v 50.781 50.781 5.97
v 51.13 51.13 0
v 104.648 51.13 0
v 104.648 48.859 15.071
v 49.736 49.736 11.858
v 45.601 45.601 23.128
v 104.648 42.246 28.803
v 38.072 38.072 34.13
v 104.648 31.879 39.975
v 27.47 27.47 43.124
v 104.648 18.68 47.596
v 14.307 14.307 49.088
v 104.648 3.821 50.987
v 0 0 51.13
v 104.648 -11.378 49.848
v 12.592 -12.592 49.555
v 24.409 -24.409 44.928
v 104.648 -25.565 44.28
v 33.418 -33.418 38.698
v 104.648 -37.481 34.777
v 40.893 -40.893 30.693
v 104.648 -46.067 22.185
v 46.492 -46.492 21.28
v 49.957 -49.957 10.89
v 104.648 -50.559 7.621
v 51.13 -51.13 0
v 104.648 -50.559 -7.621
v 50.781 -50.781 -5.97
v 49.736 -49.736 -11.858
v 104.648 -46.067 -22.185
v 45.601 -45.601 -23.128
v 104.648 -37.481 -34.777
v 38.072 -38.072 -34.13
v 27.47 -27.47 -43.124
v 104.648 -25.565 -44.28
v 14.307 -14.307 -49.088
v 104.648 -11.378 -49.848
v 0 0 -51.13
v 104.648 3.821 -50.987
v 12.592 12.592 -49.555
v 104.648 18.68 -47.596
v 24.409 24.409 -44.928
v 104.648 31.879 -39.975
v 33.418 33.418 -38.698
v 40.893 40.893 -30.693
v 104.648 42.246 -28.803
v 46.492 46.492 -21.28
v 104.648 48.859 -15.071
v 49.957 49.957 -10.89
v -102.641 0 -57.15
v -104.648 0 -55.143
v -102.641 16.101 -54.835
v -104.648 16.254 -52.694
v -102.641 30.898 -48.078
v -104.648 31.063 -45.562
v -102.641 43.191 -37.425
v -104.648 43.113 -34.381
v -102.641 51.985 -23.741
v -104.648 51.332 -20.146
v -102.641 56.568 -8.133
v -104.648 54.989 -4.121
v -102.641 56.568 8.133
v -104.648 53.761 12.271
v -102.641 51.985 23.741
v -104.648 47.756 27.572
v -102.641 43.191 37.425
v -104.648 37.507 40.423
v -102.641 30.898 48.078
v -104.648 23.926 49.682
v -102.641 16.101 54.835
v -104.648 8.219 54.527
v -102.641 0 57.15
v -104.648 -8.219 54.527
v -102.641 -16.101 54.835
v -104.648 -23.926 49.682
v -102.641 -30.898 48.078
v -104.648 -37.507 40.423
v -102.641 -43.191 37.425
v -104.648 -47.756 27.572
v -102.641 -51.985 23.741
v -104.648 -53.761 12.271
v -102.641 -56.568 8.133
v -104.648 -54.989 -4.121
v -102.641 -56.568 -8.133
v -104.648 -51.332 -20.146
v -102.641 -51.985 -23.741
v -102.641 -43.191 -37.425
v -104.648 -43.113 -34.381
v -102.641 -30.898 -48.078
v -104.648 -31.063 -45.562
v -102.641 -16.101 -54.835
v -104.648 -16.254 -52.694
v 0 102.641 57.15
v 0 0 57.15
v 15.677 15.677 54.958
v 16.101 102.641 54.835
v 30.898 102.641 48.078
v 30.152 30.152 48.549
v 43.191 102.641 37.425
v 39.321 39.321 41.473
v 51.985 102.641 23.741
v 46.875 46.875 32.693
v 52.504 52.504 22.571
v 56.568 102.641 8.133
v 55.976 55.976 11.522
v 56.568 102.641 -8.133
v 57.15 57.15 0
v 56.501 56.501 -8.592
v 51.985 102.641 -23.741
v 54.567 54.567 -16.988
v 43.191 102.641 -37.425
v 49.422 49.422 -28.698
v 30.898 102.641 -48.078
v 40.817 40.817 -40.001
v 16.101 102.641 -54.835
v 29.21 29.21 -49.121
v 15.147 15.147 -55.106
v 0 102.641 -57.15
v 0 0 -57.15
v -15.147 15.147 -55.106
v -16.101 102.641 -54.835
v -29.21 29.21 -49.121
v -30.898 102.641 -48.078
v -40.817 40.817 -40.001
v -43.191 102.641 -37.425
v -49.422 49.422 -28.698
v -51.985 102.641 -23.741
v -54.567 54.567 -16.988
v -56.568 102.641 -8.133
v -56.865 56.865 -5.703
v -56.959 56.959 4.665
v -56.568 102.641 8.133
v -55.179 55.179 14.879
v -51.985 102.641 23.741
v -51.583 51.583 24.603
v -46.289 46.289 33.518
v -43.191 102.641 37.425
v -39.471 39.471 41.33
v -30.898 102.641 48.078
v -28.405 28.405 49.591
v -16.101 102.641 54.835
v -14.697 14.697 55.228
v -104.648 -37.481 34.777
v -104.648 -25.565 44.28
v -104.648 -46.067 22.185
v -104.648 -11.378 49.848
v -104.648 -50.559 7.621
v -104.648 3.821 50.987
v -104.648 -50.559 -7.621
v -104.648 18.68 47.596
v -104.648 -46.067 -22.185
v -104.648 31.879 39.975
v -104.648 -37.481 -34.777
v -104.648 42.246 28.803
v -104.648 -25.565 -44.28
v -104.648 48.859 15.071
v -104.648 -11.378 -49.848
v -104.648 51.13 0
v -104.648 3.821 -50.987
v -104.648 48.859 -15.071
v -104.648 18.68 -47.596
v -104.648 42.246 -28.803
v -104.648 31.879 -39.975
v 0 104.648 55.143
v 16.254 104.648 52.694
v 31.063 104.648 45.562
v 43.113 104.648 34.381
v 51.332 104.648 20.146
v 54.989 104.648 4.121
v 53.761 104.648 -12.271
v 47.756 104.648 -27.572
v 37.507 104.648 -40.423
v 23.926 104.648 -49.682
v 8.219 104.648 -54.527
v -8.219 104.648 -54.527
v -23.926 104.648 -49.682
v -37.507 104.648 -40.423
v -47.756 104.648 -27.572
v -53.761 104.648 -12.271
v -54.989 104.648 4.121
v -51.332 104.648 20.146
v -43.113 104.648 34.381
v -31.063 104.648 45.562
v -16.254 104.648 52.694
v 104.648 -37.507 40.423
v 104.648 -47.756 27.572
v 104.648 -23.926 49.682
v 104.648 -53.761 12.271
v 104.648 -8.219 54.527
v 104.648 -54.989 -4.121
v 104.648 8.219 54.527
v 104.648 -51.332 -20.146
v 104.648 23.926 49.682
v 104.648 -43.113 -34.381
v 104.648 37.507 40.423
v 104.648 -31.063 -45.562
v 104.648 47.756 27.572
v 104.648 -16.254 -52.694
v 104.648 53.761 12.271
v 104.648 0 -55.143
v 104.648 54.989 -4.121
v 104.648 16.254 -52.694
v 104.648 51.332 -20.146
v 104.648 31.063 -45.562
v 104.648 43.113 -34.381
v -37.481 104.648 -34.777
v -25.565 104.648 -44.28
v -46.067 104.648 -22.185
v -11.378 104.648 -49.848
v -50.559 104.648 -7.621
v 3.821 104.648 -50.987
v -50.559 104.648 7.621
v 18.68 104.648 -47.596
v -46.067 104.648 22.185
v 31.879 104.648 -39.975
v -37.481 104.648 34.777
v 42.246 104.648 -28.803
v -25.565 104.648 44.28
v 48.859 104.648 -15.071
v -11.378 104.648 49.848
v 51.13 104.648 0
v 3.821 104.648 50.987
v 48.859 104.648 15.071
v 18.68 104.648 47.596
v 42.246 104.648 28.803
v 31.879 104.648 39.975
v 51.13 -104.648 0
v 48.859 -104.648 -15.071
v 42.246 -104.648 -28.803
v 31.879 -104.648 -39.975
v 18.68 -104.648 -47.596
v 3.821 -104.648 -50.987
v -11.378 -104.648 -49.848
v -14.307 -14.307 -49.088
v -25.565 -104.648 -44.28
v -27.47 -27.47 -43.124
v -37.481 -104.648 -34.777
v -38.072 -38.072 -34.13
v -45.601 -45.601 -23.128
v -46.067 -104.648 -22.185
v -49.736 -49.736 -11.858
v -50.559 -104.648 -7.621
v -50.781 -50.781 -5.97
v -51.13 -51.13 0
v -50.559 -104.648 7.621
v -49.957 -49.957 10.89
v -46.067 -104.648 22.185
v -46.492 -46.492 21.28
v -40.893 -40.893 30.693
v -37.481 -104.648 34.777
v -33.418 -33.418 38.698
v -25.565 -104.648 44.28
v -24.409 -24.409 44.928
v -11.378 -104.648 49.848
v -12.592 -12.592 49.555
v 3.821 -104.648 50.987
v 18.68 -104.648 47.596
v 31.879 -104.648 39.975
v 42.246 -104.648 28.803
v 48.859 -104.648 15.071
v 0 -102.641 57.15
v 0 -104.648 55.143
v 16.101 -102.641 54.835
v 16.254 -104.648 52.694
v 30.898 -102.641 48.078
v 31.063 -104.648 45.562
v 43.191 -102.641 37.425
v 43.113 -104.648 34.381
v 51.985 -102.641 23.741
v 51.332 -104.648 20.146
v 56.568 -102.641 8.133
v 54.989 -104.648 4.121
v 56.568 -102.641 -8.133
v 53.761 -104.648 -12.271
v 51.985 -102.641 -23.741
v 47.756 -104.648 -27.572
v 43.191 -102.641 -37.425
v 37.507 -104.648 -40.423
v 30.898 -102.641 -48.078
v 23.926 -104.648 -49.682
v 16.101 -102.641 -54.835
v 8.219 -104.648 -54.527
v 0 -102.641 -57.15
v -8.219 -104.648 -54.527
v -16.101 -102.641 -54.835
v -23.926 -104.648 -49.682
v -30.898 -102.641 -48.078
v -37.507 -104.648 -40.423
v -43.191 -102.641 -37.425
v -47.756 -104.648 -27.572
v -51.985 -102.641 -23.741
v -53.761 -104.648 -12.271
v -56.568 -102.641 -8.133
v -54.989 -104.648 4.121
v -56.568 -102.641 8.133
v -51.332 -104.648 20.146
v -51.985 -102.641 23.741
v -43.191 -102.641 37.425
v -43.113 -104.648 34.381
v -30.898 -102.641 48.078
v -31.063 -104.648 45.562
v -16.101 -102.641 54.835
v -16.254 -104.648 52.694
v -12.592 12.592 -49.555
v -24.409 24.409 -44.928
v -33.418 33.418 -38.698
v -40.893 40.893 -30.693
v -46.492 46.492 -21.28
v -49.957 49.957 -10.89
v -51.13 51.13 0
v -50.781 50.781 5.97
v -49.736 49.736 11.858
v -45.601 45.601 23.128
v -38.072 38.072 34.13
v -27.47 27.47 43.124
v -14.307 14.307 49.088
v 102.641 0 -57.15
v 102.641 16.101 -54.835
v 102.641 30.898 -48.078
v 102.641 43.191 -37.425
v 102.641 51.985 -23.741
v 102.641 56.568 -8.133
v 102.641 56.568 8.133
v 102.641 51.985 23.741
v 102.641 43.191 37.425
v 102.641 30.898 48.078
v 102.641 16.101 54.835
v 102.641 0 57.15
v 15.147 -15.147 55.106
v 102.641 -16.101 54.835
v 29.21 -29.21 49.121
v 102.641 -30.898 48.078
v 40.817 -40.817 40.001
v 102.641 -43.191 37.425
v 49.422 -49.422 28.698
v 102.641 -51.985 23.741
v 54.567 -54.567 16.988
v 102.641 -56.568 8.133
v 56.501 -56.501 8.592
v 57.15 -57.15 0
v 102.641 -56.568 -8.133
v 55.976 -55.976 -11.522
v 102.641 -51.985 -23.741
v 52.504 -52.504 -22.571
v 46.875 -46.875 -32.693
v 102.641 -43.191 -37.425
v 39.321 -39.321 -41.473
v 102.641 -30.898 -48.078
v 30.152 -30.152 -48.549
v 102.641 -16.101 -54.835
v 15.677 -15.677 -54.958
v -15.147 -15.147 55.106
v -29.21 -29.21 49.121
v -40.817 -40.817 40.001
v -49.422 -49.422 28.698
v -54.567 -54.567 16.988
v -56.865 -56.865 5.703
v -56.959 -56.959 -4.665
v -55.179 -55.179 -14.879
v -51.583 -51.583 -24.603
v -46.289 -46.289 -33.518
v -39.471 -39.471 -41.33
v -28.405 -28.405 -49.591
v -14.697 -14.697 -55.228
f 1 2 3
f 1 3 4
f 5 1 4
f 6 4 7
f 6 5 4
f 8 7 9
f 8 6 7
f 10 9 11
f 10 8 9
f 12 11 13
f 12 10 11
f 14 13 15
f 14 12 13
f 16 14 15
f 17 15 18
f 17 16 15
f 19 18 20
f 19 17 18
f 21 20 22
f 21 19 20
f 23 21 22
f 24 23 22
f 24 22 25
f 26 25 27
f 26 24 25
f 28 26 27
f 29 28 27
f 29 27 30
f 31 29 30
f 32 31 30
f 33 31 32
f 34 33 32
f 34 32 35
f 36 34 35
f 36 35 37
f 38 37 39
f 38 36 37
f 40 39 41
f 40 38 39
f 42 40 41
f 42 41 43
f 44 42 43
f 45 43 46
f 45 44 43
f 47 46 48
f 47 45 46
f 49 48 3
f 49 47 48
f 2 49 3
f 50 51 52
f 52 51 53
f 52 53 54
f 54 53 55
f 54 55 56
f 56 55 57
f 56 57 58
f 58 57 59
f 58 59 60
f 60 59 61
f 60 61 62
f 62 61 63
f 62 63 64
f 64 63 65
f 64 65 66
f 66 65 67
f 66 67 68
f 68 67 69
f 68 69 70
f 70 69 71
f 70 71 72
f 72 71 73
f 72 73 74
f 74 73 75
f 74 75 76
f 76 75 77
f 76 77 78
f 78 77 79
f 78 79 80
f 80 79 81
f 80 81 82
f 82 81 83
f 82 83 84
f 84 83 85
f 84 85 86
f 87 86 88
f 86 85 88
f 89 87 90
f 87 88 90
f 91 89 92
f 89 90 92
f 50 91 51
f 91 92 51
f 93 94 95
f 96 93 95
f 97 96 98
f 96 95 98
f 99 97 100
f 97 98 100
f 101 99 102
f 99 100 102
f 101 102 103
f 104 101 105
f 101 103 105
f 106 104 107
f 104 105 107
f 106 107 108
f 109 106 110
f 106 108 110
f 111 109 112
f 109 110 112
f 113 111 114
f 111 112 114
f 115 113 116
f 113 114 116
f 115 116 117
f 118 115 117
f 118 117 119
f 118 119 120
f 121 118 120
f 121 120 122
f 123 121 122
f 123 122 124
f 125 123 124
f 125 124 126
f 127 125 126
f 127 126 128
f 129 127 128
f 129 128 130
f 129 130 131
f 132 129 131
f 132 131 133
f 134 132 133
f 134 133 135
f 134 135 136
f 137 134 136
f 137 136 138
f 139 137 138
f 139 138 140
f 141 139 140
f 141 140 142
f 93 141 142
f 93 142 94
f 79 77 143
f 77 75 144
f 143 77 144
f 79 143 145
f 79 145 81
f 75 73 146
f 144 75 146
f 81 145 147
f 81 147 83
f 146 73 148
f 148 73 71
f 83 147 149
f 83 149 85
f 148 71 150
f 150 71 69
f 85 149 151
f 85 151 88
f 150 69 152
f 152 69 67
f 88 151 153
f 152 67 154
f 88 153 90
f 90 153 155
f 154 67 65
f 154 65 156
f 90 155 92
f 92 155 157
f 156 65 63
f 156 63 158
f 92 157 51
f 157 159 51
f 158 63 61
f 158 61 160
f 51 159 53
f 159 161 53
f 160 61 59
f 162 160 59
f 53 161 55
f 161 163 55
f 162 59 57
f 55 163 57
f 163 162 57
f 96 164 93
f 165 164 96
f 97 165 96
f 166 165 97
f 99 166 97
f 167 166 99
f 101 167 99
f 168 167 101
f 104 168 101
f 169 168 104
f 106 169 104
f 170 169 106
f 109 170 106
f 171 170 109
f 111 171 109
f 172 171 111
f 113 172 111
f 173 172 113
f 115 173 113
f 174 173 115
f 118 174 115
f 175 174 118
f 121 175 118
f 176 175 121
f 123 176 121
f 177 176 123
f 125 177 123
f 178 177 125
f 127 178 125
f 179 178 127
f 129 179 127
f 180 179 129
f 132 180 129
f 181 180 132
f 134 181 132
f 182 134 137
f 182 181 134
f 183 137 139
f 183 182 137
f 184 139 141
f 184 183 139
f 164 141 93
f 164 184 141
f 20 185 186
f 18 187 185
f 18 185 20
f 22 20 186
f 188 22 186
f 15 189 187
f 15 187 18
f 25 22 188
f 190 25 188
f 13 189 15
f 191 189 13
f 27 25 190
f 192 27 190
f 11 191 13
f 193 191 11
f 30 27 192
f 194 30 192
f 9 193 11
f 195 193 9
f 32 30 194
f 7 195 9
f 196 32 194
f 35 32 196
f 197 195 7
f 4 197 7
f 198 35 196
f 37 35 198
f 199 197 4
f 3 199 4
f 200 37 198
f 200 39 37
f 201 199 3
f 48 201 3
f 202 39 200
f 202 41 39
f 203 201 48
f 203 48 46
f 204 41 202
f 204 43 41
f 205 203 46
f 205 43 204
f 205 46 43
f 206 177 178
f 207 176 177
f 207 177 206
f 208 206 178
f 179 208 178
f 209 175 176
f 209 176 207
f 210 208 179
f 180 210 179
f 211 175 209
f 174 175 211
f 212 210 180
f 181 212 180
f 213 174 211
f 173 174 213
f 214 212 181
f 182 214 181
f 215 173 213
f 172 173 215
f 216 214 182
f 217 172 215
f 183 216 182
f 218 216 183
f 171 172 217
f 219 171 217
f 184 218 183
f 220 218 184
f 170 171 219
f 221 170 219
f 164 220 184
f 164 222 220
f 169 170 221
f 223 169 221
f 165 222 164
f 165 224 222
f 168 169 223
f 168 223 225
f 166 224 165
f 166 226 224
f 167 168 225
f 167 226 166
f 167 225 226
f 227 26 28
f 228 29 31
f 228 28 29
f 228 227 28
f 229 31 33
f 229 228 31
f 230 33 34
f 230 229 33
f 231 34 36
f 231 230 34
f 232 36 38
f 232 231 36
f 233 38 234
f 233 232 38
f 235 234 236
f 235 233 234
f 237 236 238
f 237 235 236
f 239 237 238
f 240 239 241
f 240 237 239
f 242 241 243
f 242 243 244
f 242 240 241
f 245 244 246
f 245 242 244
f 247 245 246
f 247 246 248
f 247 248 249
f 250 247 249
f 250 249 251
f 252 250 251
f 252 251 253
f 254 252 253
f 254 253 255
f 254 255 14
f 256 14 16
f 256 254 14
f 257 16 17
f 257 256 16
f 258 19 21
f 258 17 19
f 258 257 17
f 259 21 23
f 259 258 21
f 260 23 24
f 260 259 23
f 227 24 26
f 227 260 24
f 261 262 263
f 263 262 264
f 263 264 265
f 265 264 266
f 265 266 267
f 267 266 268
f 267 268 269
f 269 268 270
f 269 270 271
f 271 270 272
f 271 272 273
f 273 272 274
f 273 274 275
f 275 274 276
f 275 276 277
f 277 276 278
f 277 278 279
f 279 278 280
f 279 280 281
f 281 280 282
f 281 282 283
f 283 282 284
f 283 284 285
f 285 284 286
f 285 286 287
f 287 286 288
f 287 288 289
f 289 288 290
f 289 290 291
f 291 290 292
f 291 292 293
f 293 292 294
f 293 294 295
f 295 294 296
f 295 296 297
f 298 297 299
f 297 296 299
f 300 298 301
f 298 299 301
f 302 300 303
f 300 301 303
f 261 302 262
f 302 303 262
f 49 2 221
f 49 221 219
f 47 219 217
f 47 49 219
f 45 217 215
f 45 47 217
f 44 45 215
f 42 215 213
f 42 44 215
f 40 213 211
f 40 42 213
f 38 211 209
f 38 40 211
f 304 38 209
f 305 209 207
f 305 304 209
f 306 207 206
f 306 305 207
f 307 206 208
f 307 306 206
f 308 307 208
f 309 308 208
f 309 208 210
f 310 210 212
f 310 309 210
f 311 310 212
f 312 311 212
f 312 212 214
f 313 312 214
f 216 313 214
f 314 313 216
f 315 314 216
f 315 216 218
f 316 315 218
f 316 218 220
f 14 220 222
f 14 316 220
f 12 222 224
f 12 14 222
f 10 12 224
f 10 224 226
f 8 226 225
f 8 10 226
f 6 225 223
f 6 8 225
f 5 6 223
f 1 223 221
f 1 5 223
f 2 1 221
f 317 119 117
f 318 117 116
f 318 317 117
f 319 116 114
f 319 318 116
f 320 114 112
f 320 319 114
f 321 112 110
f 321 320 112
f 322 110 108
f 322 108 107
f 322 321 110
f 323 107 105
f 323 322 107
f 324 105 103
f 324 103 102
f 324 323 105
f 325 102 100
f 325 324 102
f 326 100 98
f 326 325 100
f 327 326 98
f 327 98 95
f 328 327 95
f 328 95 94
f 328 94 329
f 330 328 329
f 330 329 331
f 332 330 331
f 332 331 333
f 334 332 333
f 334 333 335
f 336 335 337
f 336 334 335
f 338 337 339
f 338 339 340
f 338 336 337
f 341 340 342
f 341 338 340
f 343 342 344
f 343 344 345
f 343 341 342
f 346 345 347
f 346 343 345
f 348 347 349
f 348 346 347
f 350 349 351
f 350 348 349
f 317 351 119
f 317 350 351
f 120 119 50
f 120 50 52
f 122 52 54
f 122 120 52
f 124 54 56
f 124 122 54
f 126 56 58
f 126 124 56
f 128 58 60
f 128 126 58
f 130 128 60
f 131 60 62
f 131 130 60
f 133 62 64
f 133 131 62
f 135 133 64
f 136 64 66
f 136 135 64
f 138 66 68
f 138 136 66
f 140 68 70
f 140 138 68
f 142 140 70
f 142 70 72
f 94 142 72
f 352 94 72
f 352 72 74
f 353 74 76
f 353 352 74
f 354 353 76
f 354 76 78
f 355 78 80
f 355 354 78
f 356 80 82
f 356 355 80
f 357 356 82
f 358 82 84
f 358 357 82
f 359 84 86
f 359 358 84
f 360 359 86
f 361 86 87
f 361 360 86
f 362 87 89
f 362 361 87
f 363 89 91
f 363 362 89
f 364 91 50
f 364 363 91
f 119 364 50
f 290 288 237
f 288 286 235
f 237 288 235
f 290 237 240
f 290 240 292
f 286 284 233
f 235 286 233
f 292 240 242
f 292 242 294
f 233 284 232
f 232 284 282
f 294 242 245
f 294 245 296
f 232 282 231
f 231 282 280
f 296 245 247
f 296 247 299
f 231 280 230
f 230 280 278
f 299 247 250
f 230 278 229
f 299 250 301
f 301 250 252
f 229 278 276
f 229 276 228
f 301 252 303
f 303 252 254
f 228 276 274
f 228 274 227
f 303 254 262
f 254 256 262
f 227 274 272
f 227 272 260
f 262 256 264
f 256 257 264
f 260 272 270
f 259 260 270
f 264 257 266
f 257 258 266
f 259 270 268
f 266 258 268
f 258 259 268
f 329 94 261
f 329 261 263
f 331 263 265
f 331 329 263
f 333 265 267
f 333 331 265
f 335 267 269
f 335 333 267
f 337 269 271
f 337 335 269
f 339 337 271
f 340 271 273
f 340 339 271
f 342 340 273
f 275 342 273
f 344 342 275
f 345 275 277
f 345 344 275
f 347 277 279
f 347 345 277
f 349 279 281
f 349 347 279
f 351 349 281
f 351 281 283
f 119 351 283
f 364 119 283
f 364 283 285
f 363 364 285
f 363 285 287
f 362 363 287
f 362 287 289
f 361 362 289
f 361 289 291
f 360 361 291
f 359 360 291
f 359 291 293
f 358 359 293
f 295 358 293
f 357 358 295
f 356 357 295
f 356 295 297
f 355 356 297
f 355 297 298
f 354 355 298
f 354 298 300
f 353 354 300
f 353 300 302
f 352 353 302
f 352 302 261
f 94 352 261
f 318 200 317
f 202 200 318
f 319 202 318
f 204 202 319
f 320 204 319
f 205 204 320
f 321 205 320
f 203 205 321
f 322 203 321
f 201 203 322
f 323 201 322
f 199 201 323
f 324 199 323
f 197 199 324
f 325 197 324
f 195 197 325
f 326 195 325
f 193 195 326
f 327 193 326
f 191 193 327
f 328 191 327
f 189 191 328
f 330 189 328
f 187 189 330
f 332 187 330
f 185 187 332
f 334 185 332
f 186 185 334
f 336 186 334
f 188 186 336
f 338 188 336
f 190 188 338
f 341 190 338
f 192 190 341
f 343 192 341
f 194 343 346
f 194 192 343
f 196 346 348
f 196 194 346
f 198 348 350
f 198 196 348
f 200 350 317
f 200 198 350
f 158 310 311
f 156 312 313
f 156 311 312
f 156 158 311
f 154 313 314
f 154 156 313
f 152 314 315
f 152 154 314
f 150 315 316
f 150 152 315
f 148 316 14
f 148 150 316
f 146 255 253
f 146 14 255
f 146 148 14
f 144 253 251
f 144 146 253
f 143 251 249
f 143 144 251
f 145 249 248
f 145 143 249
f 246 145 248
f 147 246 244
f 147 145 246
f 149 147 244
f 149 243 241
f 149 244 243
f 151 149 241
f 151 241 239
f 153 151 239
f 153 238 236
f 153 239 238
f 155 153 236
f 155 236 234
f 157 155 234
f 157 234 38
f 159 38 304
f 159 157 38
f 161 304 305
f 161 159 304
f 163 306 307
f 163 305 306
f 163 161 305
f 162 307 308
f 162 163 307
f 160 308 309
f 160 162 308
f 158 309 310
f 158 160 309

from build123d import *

# Parameters (mm, degrees)
RUNROUTE_R             = 57.15
RUNEXTRUDE_DEPTH       = 104.648
OUTLETROUTE_R          = 57.15
OUTLETEXTRUDE_DEPTH    = 104.648
CROSSSHELL_START       = -104.648
CROSSSHELL_OUTLINE_R   = 51.1302
CROSSSHELL_DEPTH       = 209.296
CROSSSHELL_2_OUTLINE_R = 51.1302
CROSSSHELL_2_DEPTH     = 209.296
CROSSCHAMFER_SIZE      = 2.0066


with BuildPart() as part:
    # RunRoute → RunExtrude (new body)
    with BuildSketch(Plane(origin=(0, 0, 0), x_dir=(0, 0, -1), z_dir=(1, 0, 0))):
        Circle(RUNROUTE_R)
    runextrude = extrude(amount=RUNEXTRUDE_DEPTH)

    # RunExtrudeMirror: RunExtrude across plane
    add(runextrude.mirror(Plane(origin=(0, 0, 0), x_dir=(0, 0, 1), z_dir=(1, 0, 0))))

    # OutletRoute → OutletExtrude (add)
    with BuildSketch(Plane(origin=(0, 0, 0), x_dir=(1, 0, 0), z_dir=(0, 1, 0))):
        with Locations(Location((0, 0, 0), (0, 0, 270))):
            Circle(OUTLETROUTE_R)
    outletextrude = extrude(amount=OUTLETEXTRUDE_DEPTH)

    # OutletExtrudeMirror: OutletExtrude across plane
    add(outletextrude.mirror(Plane.ZX))

    # CrossShell: read off the stored shape, not the designer's step
    # CrossShell outline → CrossShell (cut)
    with BuildSketch(Plane.YZ.offset(CROSSSHELL_START)):
        Circle(CROSSSHELL_OUTLINE_R)
    extrude(amount=CROSSSHELL_DEPTH, mode=Mode.SUBTRACT)

    # CrossShell 2 outline → CrossShell 2 (cut)
    with BuildSketch(Plane(origin=(0, 0, 0), x_dir=(1, 0, 0), z_dir=(0, 1, 0)).offset(CROSSSHELL_START)):
        Circle(CROSSSHELL_2_OUTLINE_R)
    extrude(amount=CROSSSHELL_2_DEPTH, mode=Mode.SUBTRACT)

    # CrossChamfer
    crosschamfer_edges = [part.edges().sort_by_distance(p)[0] for p in [
        (0, -104.648, -57.15),
        (104.648, 0, 57.15),
        (-104.648, 0, 57.15),
        (0, 104.648, -57.15),
    ]]
    chamfer(crosschamfer_edges, length=CROSSCHAMFER_SIZE)


solid = part.part
